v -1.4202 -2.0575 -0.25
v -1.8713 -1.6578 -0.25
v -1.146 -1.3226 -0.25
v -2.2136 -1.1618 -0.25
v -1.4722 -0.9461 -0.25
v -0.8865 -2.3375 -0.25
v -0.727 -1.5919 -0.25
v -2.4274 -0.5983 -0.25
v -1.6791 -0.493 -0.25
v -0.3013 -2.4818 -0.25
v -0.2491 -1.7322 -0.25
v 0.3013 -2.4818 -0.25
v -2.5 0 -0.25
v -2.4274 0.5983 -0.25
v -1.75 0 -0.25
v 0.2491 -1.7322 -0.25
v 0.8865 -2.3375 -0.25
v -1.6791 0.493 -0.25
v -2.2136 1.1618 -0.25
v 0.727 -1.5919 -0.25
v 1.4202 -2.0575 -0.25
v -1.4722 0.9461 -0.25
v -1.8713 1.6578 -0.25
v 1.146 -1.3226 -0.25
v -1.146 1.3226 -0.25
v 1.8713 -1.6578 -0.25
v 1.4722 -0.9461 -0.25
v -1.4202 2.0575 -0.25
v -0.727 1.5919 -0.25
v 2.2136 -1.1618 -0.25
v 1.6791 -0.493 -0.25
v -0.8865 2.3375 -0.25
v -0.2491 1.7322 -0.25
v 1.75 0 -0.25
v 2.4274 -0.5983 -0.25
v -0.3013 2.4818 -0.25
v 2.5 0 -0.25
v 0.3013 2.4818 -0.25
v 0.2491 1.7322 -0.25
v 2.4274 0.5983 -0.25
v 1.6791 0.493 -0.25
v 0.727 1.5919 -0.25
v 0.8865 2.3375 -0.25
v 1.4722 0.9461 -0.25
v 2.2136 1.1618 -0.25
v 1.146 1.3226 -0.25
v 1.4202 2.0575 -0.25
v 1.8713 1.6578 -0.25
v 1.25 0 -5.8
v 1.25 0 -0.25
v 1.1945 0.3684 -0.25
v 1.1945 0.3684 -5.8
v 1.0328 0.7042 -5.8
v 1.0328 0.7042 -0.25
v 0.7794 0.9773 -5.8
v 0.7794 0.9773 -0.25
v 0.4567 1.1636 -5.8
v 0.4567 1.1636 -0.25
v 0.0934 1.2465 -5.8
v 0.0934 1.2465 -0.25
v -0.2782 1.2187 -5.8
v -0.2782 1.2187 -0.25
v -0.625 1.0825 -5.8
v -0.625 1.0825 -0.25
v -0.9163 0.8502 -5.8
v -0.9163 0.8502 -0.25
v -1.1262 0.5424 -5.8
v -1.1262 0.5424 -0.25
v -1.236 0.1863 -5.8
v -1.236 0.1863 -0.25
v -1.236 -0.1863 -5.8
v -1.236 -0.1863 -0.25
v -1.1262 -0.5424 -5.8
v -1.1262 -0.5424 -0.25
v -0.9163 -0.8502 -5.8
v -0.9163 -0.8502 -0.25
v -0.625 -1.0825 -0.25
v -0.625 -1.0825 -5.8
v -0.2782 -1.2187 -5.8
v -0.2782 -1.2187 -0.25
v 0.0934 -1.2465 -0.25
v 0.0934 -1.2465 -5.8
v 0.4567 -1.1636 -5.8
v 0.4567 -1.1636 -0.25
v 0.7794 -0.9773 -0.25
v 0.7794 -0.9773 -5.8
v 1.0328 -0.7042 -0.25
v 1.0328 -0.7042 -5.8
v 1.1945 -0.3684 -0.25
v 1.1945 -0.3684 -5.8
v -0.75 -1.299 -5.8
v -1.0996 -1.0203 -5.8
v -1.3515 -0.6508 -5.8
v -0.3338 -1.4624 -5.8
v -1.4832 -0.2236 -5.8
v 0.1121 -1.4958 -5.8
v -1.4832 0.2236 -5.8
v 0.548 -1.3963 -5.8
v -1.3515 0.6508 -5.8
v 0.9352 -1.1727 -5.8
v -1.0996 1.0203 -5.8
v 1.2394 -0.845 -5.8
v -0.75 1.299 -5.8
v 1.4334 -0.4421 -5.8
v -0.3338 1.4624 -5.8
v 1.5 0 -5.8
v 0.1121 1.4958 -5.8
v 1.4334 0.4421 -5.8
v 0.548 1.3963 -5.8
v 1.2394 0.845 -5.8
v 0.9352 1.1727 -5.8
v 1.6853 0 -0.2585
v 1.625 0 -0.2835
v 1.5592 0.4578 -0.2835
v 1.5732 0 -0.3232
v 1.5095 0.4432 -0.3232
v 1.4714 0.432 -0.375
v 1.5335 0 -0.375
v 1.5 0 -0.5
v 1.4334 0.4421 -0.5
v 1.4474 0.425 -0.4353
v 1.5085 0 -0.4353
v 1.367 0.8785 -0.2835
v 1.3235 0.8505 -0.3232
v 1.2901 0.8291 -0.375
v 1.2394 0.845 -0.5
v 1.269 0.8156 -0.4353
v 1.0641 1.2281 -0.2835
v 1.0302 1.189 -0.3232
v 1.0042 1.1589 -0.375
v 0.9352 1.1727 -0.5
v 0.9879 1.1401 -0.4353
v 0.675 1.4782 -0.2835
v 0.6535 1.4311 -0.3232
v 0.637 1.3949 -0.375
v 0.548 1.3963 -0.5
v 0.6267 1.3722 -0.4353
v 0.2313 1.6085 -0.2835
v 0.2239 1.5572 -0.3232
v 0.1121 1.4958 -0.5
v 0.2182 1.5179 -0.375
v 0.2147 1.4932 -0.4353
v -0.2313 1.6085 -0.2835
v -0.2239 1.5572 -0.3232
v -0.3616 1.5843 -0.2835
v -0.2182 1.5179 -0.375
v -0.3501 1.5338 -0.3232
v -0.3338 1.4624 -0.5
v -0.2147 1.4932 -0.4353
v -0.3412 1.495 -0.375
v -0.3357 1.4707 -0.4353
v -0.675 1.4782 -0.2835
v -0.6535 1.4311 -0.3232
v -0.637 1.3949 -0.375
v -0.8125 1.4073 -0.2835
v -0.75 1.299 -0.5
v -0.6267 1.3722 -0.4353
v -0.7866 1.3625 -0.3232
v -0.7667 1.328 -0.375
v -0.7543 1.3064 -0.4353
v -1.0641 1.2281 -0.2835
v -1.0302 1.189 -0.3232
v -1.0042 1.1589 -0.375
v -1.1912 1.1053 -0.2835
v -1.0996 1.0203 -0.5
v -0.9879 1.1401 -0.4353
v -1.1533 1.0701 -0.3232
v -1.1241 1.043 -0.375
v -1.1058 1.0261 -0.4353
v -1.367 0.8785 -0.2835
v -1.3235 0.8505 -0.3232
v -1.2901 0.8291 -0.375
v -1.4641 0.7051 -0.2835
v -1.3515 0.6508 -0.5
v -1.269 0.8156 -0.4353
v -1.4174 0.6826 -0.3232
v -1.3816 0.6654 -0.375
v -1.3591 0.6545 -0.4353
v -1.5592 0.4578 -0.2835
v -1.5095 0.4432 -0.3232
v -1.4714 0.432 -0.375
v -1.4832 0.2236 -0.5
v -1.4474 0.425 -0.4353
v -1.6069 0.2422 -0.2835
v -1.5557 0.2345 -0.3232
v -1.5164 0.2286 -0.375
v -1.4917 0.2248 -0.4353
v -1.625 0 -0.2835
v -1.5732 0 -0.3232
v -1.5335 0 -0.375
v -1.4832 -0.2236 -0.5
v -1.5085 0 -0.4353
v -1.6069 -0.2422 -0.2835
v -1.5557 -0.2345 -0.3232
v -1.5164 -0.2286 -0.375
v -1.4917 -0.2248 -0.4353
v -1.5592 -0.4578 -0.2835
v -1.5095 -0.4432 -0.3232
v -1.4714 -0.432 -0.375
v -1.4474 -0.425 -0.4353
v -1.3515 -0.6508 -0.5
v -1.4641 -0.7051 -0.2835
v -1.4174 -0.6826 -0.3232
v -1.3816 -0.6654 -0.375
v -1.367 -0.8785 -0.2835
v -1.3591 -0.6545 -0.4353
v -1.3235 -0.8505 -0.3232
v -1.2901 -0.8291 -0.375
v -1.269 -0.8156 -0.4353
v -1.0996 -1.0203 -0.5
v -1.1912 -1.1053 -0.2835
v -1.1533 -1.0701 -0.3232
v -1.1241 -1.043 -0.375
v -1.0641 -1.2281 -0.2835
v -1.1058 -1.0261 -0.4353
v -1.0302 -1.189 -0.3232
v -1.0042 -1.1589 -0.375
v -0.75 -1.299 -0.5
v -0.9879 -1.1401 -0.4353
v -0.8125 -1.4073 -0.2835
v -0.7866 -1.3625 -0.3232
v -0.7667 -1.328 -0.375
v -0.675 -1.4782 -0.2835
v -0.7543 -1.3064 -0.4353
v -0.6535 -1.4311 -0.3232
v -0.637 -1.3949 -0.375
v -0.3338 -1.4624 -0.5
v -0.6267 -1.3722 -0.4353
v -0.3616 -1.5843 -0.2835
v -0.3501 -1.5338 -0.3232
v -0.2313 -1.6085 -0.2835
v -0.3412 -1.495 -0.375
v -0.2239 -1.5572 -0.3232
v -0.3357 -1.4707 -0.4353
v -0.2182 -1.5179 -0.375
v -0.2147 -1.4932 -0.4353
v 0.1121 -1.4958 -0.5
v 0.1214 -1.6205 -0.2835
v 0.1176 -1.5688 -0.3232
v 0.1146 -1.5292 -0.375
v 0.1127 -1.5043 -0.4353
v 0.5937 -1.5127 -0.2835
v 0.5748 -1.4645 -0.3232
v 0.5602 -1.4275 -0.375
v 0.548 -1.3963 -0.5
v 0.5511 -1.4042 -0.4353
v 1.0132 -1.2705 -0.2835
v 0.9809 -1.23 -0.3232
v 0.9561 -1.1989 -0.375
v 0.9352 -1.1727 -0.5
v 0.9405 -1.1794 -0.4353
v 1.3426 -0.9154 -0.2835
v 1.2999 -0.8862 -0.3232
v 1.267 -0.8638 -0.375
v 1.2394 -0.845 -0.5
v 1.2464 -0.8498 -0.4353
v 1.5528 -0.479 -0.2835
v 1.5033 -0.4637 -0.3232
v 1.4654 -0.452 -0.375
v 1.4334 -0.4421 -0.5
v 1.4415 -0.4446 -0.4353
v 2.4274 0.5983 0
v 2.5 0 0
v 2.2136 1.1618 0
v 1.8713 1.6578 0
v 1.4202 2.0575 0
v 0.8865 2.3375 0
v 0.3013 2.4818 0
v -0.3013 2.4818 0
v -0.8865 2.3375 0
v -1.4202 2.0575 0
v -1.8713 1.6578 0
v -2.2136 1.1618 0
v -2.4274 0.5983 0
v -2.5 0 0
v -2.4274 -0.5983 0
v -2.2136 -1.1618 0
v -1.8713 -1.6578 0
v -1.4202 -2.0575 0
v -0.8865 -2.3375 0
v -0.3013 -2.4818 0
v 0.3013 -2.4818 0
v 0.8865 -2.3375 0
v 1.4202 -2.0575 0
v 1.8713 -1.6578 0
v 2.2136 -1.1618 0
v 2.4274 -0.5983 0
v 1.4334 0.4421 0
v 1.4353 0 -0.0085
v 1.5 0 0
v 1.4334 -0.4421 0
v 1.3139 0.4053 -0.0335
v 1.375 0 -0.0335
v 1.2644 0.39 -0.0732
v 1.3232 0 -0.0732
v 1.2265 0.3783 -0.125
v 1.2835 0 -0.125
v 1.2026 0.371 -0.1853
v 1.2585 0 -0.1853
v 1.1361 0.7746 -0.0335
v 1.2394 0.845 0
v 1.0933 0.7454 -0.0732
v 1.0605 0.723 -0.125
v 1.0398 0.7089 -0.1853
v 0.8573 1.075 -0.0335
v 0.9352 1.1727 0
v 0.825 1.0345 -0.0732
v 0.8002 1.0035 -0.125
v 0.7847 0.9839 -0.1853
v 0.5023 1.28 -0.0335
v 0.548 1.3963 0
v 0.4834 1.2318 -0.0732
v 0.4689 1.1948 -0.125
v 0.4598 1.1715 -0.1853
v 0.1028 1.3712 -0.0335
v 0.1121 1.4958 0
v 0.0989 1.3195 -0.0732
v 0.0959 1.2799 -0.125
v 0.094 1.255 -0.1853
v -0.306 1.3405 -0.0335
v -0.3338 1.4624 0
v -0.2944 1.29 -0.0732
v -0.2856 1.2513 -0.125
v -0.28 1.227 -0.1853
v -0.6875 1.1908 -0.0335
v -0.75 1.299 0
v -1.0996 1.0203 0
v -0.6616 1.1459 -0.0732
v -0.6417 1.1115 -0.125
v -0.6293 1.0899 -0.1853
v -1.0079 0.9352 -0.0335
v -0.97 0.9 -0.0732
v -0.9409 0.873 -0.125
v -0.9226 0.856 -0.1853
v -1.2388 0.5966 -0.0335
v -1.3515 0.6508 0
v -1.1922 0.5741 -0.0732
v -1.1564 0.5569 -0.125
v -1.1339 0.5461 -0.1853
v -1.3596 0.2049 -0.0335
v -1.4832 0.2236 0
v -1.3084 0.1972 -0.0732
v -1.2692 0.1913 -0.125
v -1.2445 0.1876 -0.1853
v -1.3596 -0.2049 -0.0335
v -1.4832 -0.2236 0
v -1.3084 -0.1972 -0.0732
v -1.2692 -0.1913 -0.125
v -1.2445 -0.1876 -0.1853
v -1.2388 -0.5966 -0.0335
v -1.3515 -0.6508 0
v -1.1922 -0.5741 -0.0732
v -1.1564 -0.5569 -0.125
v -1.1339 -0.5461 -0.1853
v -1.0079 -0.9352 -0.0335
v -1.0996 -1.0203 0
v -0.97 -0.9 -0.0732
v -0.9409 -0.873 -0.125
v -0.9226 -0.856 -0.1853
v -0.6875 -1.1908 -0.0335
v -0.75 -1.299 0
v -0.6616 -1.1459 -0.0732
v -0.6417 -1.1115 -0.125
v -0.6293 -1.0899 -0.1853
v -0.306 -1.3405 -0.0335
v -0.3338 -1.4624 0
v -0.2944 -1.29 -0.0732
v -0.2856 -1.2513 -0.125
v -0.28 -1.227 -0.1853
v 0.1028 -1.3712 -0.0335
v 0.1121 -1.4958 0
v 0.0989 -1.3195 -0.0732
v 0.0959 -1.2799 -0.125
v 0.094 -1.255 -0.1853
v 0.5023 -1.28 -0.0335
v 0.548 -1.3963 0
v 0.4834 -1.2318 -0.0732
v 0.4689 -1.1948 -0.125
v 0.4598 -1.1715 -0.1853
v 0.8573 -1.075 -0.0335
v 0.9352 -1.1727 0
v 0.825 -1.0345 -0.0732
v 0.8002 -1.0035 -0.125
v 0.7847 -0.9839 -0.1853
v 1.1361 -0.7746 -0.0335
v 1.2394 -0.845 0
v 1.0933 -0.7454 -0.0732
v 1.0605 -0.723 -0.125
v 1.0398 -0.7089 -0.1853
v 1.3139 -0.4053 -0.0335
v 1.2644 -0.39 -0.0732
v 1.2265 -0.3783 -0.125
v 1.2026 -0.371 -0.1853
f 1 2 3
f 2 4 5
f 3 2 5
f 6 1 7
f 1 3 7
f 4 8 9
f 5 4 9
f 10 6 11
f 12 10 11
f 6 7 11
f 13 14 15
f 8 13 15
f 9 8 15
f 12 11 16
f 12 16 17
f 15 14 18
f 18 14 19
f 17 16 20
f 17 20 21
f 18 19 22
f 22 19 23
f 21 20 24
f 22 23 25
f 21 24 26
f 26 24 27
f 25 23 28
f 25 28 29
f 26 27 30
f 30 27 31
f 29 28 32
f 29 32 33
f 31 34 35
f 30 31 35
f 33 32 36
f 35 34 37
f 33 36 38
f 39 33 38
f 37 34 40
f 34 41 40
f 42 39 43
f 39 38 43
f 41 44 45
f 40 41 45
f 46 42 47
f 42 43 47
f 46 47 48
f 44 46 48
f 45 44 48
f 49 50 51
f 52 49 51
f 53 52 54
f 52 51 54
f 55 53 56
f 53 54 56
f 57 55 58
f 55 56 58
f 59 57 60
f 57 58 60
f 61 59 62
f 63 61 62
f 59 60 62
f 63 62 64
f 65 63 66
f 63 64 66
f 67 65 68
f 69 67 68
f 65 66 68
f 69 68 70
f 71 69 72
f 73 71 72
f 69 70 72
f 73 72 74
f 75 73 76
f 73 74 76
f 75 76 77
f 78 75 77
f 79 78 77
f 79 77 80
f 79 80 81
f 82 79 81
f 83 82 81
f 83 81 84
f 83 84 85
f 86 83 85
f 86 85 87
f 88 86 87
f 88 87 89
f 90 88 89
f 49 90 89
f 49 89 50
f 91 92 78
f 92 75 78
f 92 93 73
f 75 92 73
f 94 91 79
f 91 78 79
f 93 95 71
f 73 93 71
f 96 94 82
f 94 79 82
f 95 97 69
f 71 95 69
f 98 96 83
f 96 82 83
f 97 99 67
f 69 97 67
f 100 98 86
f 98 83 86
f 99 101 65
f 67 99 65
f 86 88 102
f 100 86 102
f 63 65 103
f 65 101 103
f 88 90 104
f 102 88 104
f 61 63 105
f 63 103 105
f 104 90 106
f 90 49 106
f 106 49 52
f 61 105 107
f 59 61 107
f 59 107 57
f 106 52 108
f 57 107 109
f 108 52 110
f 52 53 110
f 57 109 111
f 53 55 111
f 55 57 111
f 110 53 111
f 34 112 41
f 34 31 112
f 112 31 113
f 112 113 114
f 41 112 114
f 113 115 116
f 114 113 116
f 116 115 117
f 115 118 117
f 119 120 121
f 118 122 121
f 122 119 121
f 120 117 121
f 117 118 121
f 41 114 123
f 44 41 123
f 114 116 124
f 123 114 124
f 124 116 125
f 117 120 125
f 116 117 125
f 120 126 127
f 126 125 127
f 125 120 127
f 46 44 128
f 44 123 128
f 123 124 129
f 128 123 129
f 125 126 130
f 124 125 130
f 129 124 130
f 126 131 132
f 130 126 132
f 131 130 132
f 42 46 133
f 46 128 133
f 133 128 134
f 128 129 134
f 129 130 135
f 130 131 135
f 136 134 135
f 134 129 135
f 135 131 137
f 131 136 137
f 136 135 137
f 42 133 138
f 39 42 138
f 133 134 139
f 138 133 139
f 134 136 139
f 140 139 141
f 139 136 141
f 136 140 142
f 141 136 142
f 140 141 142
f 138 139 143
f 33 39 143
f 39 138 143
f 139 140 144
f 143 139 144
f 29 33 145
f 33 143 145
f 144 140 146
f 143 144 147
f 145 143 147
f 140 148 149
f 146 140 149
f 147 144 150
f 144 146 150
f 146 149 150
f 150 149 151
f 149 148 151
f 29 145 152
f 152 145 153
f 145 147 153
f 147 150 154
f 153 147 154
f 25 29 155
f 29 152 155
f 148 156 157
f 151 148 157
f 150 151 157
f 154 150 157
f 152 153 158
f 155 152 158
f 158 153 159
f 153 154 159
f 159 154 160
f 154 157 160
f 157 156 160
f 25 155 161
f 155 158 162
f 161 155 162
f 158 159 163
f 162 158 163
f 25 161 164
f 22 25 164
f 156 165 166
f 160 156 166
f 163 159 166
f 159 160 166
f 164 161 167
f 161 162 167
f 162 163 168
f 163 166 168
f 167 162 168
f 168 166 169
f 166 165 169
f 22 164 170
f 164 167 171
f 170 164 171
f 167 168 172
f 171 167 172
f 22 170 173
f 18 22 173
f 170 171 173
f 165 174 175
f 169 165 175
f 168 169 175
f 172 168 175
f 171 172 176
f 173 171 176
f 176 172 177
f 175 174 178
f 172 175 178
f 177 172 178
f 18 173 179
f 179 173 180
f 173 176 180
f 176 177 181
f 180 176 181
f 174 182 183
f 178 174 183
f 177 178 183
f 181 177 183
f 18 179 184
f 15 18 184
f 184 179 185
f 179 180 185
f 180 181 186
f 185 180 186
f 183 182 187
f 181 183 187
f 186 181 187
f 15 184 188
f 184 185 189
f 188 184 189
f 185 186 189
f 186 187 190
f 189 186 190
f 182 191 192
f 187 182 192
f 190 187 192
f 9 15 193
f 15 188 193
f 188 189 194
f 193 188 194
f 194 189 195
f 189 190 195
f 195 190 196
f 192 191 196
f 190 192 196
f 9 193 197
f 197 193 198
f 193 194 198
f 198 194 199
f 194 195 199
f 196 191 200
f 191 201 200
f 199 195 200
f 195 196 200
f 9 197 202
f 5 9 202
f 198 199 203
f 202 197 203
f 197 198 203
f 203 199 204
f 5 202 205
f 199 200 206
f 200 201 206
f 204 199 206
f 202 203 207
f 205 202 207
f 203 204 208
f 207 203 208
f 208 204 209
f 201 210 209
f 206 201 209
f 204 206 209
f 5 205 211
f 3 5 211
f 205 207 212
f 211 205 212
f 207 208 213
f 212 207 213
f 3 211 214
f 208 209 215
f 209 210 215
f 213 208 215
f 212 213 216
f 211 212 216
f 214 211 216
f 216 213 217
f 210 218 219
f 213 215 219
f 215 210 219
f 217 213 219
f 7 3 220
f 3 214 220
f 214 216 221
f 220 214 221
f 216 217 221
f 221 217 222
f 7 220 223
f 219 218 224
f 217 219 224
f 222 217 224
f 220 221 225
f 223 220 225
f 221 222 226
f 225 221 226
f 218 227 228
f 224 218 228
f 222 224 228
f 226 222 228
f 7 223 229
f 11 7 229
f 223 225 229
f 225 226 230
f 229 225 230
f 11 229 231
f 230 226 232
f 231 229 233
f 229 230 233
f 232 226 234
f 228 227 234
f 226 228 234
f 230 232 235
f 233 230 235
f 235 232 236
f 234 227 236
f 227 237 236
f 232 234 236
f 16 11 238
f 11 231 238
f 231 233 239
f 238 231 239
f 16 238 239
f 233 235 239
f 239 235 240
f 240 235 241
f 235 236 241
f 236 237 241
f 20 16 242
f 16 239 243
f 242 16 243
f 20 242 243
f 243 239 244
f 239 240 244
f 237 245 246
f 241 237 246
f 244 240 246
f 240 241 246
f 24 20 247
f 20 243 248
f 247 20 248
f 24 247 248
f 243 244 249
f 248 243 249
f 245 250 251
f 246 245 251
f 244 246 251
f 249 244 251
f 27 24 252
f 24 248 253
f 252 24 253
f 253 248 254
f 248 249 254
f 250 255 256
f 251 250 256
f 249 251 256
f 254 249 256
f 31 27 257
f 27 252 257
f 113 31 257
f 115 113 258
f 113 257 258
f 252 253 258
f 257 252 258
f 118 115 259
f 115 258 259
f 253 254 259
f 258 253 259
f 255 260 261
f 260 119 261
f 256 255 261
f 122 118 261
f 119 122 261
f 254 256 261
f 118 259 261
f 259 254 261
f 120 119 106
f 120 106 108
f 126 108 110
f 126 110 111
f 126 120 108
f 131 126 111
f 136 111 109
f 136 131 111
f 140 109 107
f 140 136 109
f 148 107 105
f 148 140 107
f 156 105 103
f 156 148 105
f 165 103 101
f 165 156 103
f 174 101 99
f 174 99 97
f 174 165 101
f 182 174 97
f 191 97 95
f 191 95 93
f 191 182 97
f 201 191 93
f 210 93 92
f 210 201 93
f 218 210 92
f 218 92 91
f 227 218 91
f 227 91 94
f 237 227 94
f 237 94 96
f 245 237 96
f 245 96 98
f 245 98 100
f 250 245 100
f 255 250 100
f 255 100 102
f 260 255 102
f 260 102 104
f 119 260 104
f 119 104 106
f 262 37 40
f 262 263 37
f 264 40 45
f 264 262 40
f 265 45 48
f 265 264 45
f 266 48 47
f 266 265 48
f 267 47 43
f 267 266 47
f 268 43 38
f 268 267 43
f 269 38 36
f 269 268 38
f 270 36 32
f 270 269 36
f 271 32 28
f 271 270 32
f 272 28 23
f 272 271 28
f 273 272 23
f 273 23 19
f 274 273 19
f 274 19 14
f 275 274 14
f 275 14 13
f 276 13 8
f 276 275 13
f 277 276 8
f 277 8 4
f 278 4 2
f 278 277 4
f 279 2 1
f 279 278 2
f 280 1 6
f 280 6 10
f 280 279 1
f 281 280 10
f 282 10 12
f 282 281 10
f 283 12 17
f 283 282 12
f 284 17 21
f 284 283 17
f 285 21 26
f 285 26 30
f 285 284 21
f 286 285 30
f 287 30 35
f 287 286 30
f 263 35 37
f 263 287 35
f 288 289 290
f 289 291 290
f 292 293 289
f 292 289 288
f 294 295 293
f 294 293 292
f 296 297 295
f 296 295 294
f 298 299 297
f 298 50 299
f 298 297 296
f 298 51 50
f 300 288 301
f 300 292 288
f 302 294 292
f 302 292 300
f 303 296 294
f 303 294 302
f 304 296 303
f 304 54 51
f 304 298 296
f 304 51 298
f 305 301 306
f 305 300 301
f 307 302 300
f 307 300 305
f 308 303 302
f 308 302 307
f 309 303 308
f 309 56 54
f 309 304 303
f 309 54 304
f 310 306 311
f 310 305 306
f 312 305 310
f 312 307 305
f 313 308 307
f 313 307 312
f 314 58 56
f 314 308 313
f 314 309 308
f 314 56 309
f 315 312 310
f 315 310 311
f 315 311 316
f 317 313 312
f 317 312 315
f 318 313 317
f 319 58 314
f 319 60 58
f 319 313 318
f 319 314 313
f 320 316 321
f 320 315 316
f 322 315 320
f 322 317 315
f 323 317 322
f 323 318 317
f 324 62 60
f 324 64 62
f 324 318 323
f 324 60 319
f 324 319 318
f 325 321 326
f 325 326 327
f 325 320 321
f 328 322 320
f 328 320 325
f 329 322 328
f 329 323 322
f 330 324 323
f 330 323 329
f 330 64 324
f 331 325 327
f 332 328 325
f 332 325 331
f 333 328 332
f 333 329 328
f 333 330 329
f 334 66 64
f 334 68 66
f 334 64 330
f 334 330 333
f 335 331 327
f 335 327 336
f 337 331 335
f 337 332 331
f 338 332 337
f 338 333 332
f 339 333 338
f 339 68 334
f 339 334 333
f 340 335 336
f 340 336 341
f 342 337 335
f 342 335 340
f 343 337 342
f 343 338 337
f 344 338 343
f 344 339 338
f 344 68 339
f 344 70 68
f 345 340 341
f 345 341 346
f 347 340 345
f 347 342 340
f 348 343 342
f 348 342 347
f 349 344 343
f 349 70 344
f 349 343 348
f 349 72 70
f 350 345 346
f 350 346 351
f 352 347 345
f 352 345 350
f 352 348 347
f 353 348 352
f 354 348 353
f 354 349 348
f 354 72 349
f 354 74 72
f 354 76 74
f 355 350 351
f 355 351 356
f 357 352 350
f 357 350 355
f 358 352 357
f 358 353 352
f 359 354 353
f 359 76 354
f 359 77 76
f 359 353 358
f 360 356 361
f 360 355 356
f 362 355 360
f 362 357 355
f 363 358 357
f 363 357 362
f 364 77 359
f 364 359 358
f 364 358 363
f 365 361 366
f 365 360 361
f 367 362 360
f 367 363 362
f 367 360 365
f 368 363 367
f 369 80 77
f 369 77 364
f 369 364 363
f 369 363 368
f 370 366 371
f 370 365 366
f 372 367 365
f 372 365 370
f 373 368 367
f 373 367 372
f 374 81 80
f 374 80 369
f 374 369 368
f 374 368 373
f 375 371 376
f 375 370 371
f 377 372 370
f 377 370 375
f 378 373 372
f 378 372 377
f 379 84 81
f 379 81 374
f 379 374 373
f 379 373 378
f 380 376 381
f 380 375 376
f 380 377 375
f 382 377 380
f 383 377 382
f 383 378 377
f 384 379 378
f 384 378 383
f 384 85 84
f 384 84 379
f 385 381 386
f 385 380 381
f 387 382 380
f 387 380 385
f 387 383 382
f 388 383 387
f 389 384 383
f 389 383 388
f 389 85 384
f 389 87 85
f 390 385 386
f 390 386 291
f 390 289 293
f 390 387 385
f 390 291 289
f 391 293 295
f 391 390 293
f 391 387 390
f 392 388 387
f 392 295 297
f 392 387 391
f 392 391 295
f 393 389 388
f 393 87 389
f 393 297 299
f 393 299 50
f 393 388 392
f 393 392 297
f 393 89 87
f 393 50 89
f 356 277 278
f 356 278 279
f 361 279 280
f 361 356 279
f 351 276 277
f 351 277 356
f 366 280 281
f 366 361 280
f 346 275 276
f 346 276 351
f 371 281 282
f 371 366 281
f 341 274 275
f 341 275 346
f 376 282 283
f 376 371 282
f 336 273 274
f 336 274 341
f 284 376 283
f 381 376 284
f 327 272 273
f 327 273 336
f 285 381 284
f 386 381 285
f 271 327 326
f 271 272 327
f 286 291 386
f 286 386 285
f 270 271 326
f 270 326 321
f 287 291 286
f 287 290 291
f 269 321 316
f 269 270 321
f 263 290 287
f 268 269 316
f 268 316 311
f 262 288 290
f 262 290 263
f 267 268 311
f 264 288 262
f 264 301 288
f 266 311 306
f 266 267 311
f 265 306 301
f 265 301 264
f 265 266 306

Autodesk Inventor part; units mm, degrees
ref_plane "YZ Plane" through (0, 0, 0) normal (1, 0, 0) x (0, 1, 0)
ref_plane "XZ Plane" through (0, 0, 0) normal (0, 1, 0) x (-1, 0, 0)
ref_plane "XY Plane" through (0, 0, 0) normal (0, 0, 1) x (1, 0, 0)
sketch "Sketch1" plane through (0, 0, 0) normal (0, 0, 1) x (1, 0, 0)
  circle A0 centre (0, 0) radius 2.5
  circle A1 centre (0, 0) radius 1.25
  circle A2 centre (0, 0) radius 1.5
  dimension "d0" = 5
  dimension "d1" = 2.5
  dimension "d2" = 3
extrude "Extrusion1" add sketch "Sketch1" against normal blind 0.25 contours A0
extrude "Extrusion2" add sketch "Sketch1" against normal blind 5.8 contours A2
fillet "Fillet1" radius 0.25 1 edges at (-1.25, 0, 0)
fillet "Fillet2" radius 0.25 1 edges at (-1.5, 0, -0.25)
properties part number "Standard Servo Brass Sleeve"
